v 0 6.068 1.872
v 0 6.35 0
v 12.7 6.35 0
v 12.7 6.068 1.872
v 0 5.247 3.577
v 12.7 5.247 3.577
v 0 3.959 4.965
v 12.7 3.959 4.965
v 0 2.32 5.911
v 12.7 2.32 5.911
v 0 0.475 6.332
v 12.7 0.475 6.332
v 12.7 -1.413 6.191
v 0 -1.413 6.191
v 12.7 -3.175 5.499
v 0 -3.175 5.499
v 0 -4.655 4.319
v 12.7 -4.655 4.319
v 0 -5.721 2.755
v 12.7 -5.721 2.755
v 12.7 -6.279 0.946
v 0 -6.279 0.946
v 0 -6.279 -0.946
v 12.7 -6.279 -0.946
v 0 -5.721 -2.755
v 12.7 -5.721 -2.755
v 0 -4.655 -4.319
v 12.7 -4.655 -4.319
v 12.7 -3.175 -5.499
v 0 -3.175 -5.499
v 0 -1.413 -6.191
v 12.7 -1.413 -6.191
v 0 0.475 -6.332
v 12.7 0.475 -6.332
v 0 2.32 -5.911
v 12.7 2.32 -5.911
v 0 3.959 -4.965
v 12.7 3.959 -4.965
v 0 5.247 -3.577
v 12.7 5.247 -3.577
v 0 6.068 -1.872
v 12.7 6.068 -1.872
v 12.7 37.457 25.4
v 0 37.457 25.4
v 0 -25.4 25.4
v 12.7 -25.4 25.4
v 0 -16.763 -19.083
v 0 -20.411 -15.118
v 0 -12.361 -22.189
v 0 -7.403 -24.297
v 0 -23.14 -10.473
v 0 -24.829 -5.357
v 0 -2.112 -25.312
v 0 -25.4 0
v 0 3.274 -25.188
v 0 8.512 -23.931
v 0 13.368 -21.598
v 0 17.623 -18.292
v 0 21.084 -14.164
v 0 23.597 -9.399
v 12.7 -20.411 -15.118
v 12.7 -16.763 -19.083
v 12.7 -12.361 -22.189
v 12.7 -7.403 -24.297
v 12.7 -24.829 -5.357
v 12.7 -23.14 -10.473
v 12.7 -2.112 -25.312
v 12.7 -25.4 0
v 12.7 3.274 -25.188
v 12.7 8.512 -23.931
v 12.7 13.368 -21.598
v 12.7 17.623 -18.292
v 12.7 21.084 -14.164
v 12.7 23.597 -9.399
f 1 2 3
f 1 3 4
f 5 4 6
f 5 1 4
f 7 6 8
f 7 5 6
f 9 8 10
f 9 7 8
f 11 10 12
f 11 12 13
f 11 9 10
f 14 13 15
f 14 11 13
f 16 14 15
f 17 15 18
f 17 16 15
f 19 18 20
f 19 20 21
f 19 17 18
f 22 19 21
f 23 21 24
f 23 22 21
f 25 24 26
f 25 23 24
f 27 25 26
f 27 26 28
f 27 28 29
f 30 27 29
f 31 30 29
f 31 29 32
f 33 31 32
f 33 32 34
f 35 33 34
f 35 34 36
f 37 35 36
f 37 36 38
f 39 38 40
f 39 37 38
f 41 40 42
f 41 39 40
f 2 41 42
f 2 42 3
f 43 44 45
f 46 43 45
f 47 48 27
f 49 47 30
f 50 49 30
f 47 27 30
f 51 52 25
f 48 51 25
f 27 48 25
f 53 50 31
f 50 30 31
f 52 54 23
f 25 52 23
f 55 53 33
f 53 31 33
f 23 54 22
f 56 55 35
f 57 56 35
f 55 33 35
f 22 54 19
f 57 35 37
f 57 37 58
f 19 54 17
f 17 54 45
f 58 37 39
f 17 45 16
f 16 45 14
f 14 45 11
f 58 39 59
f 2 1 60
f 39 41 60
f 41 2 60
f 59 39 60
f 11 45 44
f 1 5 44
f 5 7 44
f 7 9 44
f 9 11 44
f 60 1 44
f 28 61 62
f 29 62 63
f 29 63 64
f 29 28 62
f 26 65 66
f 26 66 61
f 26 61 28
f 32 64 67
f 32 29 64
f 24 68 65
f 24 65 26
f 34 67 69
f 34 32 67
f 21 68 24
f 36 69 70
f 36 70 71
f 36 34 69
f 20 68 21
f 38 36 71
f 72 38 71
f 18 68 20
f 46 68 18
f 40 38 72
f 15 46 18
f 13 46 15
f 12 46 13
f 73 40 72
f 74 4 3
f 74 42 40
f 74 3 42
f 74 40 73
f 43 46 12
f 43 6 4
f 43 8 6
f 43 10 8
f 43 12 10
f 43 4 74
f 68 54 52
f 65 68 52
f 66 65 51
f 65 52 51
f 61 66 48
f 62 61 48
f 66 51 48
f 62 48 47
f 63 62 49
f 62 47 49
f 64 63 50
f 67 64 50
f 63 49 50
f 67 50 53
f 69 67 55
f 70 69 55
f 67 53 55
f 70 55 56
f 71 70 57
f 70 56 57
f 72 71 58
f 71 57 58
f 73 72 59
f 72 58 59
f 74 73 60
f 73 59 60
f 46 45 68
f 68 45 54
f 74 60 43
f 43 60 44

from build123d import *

# Parameters (mm, degrees)
F0_R     = 6.35
F1_DEPTH = 12.7


with BuildPart() as f1:
    # F0 (on Right) → F1 (new body)
    with BuildSketch(Plane.YZ):
        with BuildLine():
            Line((37.457174, 25.4), (-25.4, 25.4))
            Line((-25.4, 25.4), (-25.4, 0))
            ThreePointArc((-25.4, 0), (-4.784957, -24.945224), (23.59718, -9.398569))
            Line((23.59718, -9.398569), (37.457174, 25.4))
        make_face()
        Circle(F0_R, mode=Mode.SUBTRACT)
    extrude(amount=F1_DEPTH)


solid = f1.part
